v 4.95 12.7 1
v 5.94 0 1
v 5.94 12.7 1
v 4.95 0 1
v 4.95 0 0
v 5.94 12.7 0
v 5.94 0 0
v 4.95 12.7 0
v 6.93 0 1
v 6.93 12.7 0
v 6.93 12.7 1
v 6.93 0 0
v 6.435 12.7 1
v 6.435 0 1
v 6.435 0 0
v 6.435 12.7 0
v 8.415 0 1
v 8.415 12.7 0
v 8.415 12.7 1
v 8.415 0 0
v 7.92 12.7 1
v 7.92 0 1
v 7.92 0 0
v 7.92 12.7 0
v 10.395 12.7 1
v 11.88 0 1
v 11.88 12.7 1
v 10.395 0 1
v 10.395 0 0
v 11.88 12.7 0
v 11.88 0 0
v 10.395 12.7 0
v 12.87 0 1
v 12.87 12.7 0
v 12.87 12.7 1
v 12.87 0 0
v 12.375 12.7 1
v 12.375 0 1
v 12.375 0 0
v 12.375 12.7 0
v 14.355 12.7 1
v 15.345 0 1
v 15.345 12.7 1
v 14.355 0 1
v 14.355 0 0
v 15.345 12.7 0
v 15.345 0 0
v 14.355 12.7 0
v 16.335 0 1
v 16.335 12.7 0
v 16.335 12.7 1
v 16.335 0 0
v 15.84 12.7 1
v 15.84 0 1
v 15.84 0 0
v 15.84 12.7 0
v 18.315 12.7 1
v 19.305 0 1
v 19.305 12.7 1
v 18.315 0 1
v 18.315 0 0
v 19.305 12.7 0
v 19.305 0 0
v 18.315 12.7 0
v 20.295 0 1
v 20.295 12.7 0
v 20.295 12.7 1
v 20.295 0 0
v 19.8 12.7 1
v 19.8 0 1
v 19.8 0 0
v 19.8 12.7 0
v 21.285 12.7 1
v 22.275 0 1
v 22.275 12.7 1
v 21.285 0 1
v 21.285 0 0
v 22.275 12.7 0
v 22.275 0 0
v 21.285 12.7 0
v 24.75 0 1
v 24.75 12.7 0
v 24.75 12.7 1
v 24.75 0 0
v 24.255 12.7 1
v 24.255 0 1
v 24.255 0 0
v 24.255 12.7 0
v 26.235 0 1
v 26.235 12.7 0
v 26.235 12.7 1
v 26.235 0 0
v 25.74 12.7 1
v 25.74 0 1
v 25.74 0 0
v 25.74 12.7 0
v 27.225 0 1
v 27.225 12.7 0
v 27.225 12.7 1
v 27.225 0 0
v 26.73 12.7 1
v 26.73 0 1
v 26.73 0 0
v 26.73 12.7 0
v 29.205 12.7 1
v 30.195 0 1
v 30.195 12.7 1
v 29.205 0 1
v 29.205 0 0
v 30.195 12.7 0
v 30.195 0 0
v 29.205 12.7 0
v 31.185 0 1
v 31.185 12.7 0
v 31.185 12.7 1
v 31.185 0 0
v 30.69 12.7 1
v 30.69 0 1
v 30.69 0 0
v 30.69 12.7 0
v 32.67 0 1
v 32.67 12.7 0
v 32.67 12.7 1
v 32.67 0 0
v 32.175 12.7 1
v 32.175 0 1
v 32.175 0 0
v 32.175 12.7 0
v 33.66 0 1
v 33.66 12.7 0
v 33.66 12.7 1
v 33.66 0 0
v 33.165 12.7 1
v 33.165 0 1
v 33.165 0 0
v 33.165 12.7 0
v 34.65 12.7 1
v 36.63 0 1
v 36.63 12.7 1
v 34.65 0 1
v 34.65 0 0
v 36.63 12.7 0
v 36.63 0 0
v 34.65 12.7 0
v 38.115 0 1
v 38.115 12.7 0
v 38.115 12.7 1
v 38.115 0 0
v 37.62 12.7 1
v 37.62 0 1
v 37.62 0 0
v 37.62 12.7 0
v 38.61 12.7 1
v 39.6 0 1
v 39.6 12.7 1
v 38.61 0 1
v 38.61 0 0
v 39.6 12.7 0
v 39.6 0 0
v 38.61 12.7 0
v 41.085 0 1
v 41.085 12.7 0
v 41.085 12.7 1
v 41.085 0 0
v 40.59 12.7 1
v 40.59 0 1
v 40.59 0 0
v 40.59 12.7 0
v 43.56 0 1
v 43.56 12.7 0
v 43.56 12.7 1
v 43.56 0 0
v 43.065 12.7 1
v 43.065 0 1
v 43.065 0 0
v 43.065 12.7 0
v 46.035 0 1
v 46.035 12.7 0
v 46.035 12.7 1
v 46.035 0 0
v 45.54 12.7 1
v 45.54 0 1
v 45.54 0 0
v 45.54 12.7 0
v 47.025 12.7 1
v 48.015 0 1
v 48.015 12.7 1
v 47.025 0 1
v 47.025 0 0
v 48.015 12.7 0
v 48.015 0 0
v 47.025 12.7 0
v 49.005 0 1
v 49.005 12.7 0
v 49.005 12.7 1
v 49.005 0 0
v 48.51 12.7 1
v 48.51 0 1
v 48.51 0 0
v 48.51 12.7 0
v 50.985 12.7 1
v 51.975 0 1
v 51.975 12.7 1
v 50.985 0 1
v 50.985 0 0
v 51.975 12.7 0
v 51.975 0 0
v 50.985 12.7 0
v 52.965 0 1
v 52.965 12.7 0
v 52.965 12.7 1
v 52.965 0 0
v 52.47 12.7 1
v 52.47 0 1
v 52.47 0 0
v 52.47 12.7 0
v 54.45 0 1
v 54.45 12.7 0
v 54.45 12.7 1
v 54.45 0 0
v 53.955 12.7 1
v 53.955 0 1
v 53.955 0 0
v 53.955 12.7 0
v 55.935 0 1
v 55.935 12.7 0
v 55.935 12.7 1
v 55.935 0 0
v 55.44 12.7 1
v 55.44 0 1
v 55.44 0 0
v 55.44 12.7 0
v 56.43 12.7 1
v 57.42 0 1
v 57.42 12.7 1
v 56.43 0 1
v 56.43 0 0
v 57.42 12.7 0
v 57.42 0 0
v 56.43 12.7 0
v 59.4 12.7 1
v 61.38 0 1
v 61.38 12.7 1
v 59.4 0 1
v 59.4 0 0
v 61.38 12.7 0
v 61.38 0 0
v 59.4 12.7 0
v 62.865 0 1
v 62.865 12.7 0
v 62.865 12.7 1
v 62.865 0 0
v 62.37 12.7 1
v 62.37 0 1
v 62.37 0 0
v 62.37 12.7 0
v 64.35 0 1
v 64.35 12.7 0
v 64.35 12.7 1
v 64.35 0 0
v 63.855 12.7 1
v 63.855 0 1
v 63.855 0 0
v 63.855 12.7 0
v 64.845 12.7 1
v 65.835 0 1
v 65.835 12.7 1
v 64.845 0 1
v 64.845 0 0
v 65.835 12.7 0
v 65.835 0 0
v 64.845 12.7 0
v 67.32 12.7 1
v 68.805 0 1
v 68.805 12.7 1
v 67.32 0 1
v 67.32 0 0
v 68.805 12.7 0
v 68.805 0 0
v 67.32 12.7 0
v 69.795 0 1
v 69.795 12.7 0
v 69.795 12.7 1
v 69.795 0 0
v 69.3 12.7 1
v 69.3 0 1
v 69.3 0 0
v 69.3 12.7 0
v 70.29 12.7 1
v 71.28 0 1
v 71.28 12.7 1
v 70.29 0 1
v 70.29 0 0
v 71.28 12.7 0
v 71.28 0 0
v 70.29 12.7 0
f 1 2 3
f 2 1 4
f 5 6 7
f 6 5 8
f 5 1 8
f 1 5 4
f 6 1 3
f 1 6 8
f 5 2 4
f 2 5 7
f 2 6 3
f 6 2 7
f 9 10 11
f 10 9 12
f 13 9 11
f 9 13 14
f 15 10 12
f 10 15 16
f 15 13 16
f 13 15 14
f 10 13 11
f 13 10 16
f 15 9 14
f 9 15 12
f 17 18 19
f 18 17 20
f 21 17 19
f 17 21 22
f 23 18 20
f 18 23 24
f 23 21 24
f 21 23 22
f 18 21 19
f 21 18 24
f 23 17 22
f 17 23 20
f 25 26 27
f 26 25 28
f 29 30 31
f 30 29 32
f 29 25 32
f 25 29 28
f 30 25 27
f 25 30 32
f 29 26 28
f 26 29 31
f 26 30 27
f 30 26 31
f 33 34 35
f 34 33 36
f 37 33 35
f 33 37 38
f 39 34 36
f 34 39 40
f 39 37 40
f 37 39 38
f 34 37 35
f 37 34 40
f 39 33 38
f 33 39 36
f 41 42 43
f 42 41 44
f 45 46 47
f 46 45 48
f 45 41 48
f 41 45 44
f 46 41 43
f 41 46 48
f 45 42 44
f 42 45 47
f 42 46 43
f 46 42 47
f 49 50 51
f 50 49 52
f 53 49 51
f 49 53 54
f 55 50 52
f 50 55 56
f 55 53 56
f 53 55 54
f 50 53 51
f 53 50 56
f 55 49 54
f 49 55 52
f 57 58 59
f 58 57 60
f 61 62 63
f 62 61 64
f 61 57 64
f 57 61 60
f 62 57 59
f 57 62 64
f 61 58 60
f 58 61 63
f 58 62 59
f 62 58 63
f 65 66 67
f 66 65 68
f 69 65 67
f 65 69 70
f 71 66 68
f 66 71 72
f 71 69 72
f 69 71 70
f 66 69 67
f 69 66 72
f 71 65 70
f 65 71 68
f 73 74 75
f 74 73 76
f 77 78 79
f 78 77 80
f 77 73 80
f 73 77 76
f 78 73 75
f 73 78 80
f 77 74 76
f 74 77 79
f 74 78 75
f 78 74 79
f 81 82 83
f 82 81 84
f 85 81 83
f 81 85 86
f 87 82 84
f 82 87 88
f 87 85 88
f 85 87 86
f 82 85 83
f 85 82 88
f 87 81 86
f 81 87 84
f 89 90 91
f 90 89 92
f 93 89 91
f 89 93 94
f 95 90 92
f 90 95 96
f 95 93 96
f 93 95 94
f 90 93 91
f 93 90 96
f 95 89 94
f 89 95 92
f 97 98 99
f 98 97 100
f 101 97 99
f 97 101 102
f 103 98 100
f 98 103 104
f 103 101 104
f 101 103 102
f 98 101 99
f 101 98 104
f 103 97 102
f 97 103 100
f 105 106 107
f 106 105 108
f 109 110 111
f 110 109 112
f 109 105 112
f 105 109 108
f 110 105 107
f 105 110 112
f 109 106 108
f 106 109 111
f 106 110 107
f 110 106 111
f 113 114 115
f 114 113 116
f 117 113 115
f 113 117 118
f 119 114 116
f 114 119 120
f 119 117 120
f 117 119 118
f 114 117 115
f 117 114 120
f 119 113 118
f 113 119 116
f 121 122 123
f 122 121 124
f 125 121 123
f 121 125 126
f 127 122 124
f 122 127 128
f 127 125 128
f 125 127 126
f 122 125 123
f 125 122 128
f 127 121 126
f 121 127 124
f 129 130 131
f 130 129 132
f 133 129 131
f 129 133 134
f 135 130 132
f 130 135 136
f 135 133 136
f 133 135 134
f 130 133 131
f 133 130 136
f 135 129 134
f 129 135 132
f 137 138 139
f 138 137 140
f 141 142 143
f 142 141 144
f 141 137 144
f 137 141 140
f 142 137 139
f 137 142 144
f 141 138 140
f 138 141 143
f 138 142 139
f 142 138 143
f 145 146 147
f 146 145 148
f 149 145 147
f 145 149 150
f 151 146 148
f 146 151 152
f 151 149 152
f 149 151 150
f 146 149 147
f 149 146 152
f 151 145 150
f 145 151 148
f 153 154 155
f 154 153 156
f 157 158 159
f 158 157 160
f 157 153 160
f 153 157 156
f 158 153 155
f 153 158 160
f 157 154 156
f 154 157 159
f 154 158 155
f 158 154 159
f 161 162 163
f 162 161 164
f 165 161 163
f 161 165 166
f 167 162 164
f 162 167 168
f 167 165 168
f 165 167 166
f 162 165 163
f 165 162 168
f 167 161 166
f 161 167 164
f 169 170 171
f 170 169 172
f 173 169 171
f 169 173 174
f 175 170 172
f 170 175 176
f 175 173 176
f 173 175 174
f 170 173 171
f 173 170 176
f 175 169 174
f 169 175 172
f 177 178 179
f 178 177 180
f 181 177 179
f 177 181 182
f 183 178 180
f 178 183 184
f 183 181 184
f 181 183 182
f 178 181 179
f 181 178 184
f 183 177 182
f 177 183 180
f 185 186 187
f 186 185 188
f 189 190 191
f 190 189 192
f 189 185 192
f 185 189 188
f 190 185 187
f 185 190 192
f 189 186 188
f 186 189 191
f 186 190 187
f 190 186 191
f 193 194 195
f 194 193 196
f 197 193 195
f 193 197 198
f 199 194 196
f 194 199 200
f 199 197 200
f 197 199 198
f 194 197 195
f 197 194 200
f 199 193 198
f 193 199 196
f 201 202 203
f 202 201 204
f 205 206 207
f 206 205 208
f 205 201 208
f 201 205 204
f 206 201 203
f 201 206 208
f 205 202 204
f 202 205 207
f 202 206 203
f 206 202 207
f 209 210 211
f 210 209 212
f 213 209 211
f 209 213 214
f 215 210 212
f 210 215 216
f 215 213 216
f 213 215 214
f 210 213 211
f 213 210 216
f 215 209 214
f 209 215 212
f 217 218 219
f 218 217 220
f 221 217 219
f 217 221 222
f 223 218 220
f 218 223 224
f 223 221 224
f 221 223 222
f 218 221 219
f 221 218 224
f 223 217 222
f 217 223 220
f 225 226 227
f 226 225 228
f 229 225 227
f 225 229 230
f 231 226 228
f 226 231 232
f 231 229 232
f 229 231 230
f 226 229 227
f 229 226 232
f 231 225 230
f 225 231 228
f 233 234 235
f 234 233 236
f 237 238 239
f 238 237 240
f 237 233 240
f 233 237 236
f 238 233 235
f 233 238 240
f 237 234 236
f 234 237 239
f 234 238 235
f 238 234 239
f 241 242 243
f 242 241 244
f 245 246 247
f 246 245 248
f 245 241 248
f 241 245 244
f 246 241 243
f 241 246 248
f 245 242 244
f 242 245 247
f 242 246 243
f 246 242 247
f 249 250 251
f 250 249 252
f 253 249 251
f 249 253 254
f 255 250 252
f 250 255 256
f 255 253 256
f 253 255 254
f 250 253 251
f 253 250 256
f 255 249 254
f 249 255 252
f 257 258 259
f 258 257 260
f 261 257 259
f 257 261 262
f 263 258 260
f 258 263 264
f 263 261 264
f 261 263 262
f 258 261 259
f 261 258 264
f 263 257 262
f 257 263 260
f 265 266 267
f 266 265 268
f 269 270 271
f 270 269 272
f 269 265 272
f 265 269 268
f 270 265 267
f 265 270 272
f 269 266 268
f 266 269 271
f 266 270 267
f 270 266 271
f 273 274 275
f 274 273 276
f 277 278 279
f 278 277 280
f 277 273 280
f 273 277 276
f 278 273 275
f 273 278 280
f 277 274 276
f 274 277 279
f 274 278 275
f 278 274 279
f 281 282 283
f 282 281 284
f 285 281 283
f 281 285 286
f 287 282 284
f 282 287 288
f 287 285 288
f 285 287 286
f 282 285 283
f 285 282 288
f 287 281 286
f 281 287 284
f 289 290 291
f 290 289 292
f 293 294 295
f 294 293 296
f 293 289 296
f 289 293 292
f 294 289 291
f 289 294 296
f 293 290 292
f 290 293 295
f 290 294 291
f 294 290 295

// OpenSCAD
// file: ../../util/bitmap.scad
/*****************************************************************************
 * Module Bitmap Library
 * Modules to create bitmaps of unit squares from 1 or 2 dimensional vectors.
 *****************************************************************************
 * Copyright 2017 Chris Baker
 *
 * This program is free software: you can redistribute it and/or modify
 * it under the terms of the GNU Lesser General Public License as published by
 * the Free Software Foundation, either version 3 of the License, or
 * (at your option) any later version.
 *
 * This program is distributed in the hope that it will be useful,
 * but WITHOUT ANY WARRANTY; without even the implied warranty of
 * MERCHANTABILITY or FITNESS FOR A PARTICULAR PURPOSE.  See the
 * GNU Lesser General Public License for more details.
 *
 * You should have received a copy of the GNU Lesser General Public License
 * along with this program.  If not, see <http://www.gnu.org/licenses/>.
 *****************************************************************************
 * Usage:
 * Include this file with the "use" tag.
 * Depends on compat.scad library.
 *
 * API:
 *   1dbitmap(bitmap, center, expansion, vector_mode)
 *   2dbitmap(bitmap, center, expansion, vector_mode)
 *     Generate a 1 or 2-Dimensional field of modules based on the provided
 *     bitmap vector. See Bitmap Vectors below.
 *     The center flag determines whether to center the bitmap on the origin.
 *     The expansion value actually shrinks each cube in the x and y
 *     dimension by the specified amount.
 *     The vector_mode flag determines whether to create 3D solid geometry
 *     (unit cubes) or 2D vector geometry (squares).
 *
 * Bitmap Vectors:
 *   The bitmap vectors primarily provide boolean information.
 *   A module will be placed where these vectors have a postive value and
 *   skipped where they have a negative value. I.E. 0, -1, false, and undef
 *   are all equivalent and result in a skip. 1 and true are equivalent and
 *   result in a placed 1-unit module.
 *   Further, if the value is an integer it will be treated as a height for
 *   the module, allowing z-maps to be created.
 *   If the value is not an integer or boolean, it will be treated as a color
 *   reference. This can be a string or RGBA vector that will be used to
 *   color the module in the OpenSCAD preview window.
 *   In current versions of OpenSCAD, the color has no effect in the rendered
 *   view or STL output.
 *
 * Vector Mode:
 *   Although OpenSCAD supports generating 2D geometry, there are several
 *   caveats:
 *   - 2D and 3D geometry cannot be mixed
 *   - Extruding 2D geometry causes color information to be lost
 *   - All 2D geometry is projected onto the XY plane when rendering
 *   - Rendering also results in loss of color (same as 3D)
 *   - The SVG exporter is somewhat limited:
 *     - The pixel size of the image is hard-coded in the file
 *     - The title of the image is a generic string
 *     - The color selection for stroke and fill is fixed
 *     - The stroke-width is set to a large value that will cause overlap
 *     - The background is transparent
 *     - Only one path element is created with all of the geometry; there is
 *       no easy way to split up the geometry into multiple logical units.
 *     - These issues can mostly be resolved by hand-editing the file:
 *       - Remove or modify the width and height parameters from the svg
 *         element at the top of the file to provide better scaling.
 *       - Edit the title element at the top of the file to change the title.
 *       - Edit the stroke and fill parameters of the path element (these will
 *         probably be at the end of the file).
 *       - Set the stroke-width parameter for the path element to 0.
 *****************************************************************************/
use <compat.scad>

/*
 * 2dbitmap - Turn a 2D vector into a bitmap of cubes
 *
 * bitmap - 2D vector representing where to place each cube
 *          Value can either be boolean, z-height, or color
 * center - center cubes around the origin
 * expansion - size of gap around each pixel (screendoor)
 * vector_mode - create a 2D vector drawing instead of 3D extrusion
 */
module 2dbitmap(bitmap=[[1,0],[0,1]], center=false, expansion=0, vector_mode=false)
{
	ylen=len(bitmap)-1;

	for (y=[0:ylen]) {
		xlen=len(bitmap[y])-1;
		for (x=[0:xlen])
			translate([x-(center?xlen/2:0),ylen-y-(center?ylen/2:0),0])
				if (is_indexable(bitmap[y][x]))
					color(bitmap[y][x])
						if (vector_mode)
							square([1-expansion,1-expansion], center=center);
						else
							cube([1-expansion,1-expansion,1], center=center);
				else
					if (bitmap[y][x])
						if (vector_mode)
							square([1-expansion,1-expansion], center=center);
						else
							cube([1-expansion,1-expansion,clamp_nonnum(bitmap[y][x])], center=center);
	}
}

module 1dbitmap(bitmap=[1,0,1,0,1], center=false, expansion=0, vector_mode=false)
	2dbitmap([bitmap], center, expansion, vector_mode);

/*
 * Examples
 */

// 1D with z-height
translate([10,0,0]) scale([1,10,1])
	1dbitmap(bitmap=[1,1,0,2,0,0,3], expansion=.1);

// 1D with boolean
translate([-20,0,0]) scale([1,10,1])
	1dbitmap(bitmap=[true,false,true,false,true,true]);

// 2D with z-height
scale([2,2,1])
	2dbitmap(bitmap=[[1,0,2,1],[0,3,3,0],[1,1,0,1]],
		center=true);

// 1D with color
translate([0,-10,0]) scale([1,3,1])
	1dbitmap(bitmap=["red","white","blue",[0,0.3,0,0.5]]);

// 1D with color using 2D-vector-mode
translate([-7,-8,0]) scale([1,2])
	1dbitmap(bitmap=["red",0,"blue",0,"green"], vector_mode=true);
translate([-4.5,-10,0]) scale([1,2])
	1dbitmap(bitmap=["red",0,"blue",0,"green"], vector_mode=true, center=true);
// main file
/* Unit Test 07: bar=true */
use <../code128.scad>

code_128(cs128_b("Wikipedia"), bar=true);
